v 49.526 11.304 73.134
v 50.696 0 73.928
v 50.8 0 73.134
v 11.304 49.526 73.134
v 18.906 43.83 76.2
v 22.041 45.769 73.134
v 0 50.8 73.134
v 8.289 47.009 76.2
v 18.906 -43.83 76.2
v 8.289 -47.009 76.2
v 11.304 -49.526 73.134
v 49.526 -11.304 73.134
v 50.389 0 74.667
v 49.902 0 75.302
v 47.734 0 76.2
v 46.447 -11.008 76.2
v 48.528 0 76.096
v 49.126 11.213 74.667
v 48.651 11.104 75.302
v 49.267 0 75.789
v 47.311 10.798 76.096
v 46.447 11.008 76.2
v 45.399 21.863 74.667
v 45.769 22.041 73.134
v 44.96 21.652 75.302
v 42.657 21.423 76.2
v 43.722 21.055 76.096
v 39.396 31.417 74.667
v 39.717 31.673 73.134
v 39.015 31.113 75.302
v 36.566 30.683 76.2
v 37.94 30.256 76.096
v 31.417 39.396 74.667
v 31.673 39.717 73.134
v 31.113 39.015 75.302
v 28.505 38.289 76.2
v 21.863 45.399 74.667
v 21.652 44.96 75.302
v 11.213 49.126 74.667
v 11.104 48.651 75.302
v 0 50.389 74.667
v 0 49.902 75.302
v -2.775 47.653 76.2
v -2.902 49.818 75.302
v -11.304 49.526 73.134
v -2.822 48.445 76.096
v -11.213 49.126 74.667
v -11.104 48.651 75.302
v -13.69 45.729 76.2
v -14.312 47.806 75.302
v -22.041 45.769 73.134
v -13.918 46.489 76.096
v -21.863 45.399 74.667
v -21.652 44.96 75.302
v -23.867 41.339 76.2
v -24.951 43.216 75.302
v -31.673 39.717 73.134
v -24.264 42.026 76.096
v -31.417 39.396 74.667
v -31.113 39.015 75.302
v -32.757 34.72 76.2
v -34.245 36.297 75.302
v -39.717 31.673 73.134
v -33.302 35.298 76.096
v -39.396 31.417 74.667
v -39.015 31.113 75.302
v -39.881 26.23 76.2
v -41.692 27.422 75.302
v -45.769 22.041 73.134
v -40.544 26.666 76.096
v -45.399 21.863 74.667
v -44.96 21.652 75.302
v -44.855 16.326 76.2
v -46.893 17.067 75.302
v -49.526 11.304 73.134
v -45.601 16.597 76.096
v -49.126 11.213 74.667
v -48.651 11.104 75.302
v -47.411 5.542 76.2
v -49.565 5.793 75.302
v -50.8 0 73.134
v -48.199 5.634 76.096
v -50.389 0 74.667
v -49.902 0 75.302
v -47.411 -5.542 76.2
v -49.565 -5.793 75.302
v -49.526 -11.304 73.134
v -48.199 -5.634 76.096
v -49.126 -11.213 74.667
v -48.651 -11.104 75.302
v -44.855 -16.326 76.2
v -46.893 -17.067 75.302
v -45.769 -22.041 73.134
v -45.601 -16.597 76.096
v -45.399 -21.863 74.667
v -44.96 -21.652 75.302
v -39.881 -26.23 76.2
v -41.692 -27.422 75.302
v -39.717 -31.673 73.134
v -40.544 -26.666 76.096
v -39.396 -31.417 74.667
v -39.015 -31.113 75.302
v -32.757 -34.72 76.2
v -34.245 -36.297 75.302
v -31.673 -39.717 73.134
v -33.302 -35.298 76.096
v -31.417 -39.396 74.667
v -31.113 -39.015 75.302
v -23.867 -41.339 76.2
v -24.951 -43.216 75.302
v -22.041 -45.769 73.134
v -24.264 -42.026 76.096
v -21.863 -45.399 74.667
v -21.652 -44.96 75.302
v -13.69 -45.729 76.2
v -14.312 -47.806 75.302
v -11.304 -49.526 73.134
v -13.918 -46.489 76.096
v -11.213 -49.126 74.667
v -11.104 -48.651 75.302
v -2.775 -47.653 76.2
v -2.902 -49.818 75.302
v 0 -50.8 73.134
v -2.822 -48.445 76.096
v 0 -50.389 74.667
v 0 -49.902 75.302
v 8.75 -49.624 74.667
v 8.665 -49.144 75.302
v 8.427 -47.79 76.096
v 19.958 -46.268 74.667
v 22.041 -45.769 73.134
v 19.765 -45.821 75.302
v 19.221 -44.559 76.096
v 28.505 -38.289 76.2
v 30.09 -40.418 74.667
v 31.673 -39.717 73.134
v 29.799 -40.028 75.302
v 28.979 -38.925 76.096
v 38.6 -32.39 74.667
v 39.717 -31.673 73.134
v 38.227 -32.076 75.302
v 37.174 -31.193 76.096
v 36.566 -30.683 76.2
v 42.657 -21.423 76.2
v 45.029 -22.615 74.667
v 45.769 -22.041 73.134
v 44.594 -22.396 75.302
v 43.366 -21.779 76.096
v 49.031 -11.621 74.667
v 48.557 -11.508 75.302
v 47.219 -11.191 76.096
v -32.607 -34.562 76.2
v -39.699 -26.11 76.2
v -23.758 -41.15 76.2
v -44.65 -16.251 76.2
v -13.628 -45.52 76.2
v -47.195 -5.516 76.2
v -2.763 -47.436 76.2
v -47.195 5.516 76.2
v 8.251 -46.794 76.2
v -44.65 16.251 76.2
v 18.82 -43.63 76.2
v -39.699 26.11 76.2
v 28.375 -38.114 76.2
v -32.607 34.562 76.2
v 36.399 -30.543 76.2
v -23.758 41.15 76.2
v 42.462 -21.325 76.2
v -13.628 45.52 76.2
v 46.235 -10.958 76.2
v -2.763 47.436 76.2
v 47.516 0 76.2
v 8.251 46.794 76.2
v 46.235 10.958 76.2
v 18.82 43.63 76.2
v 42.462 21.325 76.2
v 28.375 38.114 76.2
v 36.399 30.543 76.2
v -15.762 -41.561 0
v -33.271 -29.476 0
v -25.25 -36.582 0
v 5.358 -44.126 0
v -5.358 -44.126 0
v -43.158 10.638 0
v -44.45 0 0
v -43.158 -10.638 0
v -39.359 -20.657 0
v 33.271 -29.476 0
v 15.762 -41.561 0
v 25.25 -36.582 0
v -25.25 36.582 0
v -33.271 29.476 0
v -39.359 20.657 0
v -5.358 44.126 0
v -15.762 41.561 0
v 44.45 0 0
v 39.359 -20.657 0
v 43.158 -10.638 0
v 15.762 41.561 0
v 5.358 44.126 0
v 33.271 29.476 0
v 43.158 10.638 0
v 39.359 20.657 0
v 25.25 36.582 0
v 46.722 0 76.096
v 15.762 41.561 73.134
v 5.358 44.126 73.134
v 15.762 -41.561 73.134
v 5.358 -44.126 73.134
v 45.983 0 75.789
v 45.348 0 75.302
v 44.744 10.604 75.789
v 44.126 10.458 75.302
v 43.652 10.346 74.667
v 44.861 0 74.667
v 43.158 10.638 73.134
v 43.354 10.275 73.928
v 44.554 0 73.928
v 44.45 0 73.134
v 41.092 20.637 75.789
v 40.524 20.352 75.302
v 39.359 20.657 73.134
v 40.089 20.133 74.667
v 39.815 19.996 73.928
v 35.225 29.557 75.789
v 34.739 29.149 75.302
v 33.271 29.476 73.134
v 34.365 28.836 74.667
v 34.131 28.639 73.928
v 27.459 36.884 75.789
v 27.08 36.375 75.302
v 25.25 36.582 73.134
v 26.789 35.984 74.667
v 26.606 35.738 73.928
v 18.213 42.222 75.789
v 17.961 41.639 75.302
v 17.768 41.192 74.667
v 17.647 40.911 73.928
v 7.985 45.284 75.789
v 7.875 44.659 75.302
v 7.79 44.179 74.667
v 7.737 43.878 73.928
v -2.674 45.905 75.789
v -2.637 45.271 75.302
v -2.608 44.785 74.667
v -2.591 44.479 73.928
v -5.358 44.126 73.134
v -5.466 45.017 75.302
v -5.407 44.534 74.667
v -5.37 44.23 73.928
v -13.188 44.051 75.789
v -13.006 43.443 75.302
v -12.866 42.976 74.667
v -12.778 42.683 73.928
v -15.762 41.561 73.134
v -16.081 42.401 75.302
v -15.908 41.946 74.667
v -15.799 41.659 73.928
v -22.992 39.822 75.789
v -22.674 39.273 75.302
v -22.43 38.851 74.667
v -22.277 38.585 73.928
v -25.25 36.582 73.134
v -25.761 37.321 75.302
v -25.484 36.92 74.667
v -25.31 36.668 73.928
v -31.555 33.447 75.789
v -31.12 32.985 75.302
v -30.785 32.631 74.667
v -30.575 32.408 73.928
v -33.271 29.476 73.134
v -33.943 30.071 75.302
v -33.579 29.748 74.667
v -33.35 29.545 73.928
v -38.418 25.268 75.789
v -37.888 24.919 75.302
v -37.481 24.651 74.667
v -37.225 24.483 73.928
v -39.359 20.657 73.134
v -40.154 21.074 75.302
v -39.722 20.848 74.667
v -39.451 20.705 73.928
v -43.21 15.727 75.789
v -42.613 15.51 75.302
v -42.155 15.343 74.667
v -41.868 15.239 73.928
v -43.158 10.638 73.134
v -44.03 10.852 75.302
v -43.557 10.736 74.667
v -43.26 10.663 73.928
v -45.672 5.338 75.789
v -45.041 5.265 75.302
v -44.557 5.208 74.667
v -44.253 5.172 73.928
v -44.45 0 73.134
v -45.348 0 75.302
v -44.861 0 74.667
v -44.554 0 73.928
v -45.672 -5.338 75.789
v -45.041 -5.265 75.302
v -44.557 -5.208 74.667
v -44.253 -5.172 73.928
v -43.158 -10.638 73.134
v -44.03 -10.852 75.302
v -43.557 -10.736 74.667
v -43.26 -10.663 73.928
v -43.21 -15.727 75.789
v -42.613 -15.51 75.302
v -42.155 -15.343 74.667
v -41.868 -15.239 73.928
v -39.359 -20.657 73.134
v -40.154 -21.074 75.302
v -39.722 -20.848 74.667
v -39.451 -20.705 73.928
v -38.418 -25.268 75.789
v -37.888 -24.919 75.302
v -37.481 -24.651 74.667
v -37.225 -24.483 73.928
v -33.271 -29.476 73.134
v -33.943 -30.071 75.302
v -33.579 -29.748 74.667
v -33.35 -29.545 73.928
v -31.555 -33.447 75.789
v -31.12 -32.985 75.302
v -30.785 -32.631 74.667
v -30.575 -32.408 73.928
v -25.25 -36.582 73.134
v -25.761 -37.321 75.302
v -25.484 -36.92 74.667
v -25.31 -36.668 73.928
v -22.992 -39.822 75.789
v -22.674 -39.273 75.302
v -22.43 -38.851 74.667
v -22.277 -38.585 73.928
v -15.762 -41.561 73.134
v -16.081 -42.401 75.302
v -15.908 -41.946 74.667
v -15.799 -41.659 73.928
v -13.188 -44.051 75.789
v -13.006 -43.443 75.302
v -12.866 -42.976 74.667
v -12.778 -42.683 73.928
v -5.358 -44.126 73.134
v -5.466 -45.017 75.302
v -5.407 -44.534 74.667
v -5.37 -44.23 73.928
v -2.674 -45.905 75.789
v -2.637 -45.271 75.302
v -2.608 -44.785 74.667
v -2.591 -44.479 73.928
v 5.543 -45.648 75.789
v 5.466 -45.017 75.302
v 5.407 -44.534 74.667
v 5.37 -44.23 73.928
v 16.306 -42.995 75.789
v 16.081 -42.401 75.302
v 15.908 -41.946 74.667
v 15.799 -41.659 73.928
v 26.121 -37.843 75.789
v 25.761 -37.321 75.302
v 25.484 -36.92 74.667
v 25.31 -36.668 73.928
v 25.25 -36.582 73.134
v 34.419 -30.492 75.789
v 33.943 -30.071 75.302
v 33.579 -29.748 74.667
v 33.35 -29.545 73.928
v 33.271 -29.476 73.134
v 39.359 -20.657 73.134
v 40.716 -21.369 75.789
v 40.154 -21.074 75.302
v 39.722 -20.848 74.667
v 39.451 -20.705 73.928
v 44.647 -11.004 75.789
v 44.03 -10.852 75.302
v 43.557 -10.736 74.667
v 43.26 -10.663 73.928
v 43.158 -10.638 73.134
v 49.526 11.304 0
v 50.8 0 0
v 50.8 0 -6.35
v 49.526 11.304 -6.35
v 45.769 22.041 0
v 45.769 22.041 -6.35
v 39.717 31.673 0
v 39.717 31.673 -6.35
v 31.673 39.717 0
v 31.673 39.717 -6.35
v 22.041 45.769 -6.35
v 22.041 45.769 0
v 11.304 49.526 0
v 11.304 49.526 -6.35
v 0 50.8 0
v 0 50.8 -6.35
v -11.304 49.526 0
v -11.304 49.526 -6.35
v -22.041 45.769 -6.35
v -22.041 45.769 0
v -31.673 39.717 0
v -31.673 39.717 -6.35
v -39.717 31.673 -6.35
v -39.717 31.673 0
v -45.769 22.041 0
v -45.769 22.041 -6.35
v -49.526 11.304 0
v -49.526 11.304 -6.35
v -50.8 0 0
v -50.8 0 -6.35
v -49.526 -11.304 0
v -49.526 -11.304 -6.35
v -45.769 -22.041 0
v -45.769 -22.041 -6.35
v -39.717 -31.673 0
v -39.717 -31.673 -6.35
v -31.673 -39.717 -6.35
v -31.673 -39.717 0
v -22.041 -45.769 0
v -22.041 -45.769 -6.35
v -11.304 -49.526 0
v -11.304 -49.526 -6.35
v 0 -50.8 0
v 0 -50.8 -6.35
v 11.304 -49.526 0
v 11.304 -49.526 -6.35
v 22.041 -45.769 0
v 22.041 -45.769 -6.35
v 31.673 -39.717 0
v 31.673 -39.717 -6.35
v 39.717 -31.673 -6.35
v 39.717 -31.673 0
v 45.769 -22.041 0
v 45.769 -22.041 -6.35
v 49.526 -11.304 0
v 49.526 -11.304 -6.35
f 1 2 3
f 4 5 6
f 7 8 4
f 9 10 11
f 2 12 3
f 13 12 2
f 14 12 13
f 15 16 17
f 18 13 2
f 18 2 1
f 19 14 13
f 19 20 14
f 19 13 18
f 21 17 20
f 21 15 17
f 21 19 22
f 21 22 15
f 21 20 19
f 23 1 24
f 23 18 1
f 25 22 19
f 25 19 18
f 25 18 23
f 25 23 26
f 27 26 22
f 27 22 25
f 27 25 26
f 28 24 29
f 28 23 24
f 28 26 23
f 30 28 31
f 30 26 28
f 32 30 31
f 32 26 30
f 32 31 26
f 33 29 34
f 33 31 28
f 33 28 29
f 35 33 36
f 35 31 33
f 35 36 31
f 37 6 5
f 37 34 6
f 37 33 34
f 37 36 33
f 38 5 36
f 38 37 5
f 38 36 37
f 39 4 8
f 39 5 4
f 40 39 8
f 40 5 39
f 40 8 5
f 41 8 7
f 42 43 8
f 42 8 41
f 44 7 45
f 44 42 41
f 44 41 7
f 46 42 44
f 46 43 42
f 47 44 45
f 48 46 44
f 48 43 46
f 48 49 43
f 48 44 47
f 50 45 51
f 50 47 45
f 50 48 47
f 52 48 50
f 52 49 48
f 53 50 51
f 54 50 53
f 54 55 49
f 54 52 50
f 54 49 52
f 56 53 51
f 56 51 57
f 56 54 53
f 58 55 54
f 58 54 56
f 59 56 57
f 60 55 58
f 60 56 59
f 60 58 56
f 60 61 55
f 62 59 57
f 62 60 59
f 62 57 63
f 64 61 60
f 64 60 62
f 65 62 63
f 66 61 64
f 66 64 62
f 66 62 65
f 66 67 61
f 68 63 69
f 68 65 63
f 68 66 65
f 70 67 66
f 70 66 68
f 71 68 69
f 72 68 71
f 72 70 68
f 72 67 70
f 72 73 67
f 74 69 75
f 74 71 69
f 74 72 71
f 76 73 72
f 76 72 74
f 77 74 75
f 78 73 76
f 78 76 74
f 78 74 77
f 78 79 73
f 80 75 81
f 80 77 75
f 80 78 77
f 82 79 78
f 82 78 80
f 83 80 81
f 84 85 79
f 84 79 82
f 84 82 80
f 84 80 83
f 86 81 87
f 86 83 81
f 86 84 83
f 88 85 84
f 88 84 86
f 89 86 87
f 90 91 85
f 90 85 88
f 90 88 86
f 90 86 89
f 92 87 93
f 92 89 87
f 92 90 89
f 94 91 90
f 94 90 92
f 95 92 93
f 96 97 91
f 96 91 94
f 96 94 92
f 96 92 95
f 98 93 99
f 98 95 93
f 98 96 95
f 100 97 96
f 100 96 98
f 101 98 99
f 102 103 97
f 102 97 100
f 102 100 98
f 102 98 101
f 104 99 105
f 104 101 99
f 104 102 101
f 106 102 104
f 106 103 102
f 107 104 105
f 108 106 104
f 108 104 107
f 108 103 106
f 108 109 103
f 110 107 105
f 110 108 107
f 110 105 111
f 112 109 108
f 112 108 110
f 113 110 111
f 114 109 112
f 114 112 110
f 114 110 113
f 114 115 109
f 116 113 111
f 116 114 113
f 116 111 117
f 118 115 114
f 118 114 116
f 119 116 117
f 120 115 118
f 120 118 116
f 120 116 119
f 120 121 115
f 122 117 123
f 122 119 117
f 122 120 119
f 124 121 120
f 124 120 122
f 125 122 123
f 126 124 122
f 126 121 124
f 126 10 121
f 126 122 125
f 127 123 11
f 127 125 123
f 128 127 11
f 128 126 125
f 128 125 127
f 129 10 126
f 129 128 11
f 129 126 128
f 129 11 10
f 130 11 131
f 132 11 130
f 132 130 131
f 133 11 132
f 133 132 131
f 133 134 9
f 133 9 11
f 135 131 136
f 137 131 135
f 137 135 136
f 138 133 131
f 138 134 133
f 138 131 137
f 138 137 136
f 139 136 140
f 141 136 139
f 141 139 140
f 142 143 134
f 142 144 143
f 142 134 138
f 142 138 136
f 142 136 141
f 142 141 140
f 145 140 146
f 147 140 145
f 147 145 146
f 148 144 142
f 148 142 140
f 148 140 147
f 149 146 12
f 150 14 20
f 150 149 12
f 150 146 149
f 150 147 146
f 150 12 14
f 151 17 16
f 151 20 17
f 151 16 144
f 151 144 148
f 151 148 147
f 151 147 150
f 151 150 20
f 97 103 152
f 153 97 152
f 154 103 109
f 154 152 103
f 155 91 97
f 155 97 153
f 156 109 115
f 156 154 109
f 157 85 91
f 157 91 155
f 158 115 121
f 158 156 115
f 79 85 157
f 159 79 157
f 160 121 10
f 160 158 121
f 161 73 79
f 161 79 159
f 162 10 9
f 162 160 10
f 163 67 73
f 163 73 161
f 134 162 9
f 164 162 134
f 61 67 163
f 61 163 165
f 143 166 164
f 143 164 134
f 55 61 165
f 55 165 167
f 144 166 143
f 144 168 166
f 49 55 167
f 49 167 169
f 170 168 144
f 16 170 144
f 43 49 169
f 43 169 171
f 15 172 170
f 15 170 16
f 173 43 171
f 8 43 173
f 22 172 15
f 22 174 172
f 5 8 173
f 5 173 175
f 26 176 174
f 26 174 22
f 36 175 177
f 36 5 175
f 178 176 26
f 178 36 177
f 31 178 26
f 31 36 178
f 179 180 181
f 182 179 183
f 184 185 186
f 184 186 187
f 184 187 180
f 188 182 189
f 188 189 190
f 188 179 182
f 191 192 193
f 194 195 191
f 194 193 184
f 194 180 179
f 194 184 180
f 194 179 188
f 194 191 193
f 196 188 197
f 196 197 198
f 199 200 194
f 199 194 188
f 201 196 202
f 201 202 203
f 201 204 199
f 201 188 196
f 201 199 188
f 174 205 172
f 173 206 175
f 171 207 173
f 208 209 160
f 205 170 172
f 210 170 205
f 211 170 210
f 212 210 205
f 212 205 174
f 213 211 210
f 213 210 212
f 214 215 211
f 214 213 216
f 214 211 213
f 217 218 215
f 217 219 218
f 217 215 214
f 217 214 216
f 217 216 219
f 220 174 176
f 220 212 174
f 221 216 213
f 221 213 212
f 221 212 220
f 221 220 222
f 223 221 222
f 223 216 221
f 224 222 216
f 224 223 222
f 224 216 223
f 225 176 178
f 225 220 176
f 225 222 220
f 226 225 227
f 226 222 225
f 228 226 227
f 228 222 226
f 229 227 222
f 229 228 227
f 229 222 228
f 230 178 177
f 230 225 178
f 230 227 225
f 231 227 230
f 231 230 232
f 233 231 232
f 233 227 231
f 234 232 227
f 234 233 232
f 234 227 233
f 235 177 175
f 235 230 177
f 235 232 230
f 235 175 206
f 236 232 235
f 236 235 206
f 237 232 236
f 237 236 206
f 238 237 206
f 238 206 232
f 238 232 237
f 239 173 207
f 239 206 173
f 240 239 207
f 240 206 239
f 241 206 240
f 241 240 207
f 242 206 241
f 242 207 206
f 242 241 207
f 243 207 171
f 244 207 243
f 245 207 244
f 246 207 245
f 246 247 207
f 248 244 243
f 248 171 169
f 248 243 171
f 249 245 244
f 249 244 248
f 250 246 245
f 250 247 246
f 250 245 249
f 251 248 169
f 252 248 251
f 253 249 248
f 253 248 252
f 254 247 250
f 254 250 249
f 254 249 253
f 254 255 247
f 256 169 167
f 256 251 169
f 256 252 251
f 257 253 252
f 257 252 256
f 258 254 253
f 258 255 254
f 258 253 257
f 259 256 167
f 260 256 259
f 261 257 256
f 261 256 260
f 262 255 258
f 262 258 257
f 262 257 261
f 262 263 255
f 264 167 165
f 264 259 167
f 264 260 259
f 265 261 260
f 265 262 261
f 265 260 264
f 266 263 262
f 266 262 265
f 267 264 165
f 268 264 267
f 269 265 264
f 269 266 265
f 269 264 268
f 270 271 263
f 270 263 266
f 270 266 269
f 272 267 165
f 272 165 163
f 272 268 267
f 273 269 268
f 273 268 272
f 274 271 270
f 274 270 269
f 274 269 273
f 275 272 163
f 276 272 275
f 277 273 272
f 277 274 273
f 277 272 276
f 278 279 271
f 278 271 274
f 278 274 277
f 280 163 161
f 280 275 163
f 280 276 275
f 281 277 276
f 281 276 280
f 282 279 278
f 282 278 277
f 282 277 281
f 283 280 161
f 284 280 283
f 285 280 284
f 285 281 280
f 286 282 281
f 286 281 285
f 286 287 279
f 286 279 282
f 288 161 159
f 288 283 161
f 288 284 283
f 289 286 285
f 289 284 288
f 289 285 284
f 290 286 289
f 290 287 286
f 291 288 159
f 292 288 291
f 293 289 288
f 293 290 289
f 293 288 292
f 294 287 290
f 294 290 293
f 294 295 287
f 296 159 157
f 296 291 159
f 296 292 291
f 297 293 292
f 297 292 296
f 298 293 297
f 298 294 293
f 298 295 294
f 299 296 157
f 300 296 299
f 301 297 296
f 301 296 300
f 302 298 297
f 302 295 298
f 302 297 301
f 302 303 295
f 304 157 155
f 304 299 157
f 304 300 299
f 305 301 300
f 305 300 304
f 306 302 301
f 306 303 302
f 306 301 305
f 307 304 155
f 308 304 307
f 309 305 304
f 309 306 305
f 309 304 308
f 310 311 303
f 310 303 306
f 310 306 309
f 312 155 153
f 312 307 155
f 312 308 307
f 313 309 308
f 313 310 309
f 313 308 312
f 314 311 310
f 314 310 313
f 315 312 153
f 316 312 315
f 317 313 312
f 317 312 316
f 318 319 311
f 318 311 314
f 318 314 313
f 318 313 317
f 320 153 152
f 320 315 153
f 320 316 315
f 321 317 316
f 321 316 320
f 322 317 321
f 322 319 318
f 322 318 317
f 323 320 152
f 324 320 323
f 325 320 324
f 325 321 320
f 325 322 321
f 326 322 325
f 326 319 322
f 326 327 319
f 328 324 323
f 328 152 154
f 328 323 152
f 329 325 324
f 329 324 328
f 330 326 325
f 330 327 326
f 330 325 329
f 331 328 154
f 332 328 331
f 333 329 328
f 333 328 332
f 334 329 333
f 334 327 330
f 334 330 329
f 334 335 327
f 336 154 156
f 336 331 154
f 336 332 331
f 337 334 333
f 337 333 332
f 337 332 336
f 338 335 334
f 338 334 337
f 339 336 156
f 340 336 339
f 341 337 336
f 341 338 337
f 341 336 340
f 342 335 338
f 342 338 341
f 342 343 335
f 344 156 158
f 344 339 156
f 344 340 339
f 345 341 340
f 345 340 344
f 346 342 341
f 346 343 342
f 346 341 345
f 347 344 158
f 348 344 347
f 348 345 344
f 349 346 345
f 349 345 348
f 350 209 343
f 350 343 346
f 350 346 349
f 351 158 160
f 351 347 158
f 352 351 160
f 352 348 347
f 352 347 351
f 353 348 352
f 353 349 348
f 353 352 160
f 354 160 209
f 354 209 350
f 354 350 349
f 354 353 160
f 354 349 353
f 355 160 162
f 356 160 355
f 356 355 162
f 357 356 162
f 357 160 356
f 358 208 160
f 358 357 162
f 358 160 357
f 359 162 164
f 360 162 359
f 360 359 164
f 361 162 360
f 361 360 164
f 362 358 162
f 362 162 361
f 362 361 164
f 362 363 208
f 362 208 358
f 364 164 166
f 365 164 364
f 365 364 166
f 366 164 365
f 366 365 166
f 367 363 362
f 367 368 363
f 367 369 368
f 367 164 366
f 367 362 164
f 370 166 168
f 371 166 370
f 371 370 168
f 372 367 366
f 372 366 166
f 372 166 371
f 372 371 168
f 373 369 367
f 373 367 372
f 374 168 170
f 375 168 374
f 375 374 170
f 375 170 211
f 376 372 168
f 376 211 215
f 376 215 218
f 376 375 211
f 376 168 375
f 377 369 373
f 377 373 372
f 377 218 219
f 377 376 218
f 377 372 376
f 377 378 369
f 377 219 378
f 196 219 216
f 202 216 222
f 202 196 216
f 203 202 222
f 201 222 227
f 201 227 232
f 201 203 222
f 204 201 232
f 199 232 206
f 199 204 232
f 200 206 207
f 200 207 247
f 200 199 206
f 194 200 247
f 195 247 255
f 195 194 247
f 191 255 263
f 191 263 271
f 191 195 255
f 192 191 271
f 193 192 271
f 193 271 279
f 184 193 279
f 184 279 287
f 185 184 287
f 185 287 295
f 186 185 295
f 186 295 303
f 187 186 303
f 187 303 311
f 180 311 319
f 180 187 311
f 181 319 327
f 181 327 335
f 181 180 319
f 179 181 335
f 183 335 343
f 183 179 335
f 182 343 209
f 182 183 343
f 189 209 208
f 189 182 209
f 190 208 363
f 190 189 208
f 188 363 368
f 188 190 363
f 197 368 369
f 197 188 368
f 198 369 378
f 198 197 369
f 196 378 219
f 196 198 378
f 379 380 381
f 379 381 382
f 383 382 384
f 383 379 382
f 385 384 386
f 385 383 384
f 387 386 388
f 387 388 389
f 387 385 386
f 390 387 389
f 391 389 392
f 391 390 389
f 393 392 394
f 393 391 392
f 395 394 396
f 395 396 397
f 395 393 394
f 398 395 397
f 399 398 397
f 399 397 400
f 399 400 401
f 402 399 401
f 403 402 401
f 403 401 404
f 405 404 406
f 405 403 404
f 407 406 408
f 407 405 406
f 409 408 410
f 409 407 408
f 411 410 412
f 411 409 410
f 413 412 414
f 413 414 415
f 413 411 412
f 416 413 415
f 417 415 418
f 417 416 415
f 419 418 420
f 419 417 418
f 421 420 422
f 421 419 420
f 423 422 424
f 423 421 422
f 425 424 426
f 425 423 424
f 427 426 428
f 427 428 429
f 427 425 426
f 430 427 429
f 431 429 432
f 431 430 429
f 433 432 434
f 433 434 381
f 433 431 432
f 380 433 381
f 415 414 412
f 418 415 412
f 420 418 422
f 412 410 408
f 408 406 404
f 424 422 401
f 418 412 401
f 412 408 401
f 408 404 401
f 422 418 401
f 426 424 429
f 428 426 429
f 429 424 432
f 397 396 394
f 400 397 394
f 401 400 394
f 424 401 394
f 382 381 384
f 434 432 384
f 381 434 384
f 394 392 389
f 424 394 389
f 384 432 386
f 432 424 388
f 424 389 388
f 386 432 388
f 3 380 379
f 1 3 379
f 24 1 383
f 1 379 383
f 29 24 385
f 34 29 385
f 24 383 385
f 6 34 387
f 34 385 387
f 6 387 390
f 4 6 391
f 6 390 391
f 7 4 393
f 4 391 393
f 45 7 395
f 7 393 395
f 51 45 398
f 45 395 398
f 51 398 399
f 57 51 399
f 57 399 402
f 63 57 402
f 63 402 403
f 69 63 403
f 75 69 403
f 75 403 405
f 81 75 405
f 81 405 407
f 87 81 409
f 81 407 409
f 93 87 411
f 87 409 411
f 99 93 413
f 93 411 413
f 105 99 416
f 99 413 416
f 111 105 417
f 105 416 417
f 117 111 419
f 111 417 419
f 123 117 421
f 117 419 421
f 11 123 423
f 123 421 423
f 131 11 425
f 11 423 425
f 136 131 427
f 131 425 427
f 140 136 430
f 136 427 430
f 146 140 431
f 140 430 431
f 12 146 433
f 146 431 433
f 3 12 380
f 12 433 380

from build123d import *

# Parameters (mm, degrees)
F0_R     = 50.8
F1_DEPTH = 6.35
F2_R     = 50.8
F2_R_2   = 44.45
F3_DEPTH = 76.2
F4_R     = 3.066051
F5_R     = 3.066051


with BuildPart() as f1:
    # F0 (on Top) → F1 (new body)
    with BuildSketch(Plane.XY):
        Circle(F0_R)
    extrude(amount=-F1_DEPTH)

    # F2 (on face) → F3 (join)
    with BuildSketch(Plane.XY):
        Circle(F2_R)
        Circle(F2_R_2, mode=Mode.SUBTRACT)
    extrude(amount=F3_DEPTH)

    # F4
    f4_edges = [f1.edges().sort_by_distance(p)[0] for p in [
        (-50.8, 0, 76.2),
    ]]
    fillet(f4_edges, radius=F4_R)

    # F5
    f5_edges = [f1.edges().sort_by_distance(p)[0] for p in [
        (-44.45, 0, 76.2),
    ]]
    fillet(f5_edges, radius=F5_R)


solid = f1.part
